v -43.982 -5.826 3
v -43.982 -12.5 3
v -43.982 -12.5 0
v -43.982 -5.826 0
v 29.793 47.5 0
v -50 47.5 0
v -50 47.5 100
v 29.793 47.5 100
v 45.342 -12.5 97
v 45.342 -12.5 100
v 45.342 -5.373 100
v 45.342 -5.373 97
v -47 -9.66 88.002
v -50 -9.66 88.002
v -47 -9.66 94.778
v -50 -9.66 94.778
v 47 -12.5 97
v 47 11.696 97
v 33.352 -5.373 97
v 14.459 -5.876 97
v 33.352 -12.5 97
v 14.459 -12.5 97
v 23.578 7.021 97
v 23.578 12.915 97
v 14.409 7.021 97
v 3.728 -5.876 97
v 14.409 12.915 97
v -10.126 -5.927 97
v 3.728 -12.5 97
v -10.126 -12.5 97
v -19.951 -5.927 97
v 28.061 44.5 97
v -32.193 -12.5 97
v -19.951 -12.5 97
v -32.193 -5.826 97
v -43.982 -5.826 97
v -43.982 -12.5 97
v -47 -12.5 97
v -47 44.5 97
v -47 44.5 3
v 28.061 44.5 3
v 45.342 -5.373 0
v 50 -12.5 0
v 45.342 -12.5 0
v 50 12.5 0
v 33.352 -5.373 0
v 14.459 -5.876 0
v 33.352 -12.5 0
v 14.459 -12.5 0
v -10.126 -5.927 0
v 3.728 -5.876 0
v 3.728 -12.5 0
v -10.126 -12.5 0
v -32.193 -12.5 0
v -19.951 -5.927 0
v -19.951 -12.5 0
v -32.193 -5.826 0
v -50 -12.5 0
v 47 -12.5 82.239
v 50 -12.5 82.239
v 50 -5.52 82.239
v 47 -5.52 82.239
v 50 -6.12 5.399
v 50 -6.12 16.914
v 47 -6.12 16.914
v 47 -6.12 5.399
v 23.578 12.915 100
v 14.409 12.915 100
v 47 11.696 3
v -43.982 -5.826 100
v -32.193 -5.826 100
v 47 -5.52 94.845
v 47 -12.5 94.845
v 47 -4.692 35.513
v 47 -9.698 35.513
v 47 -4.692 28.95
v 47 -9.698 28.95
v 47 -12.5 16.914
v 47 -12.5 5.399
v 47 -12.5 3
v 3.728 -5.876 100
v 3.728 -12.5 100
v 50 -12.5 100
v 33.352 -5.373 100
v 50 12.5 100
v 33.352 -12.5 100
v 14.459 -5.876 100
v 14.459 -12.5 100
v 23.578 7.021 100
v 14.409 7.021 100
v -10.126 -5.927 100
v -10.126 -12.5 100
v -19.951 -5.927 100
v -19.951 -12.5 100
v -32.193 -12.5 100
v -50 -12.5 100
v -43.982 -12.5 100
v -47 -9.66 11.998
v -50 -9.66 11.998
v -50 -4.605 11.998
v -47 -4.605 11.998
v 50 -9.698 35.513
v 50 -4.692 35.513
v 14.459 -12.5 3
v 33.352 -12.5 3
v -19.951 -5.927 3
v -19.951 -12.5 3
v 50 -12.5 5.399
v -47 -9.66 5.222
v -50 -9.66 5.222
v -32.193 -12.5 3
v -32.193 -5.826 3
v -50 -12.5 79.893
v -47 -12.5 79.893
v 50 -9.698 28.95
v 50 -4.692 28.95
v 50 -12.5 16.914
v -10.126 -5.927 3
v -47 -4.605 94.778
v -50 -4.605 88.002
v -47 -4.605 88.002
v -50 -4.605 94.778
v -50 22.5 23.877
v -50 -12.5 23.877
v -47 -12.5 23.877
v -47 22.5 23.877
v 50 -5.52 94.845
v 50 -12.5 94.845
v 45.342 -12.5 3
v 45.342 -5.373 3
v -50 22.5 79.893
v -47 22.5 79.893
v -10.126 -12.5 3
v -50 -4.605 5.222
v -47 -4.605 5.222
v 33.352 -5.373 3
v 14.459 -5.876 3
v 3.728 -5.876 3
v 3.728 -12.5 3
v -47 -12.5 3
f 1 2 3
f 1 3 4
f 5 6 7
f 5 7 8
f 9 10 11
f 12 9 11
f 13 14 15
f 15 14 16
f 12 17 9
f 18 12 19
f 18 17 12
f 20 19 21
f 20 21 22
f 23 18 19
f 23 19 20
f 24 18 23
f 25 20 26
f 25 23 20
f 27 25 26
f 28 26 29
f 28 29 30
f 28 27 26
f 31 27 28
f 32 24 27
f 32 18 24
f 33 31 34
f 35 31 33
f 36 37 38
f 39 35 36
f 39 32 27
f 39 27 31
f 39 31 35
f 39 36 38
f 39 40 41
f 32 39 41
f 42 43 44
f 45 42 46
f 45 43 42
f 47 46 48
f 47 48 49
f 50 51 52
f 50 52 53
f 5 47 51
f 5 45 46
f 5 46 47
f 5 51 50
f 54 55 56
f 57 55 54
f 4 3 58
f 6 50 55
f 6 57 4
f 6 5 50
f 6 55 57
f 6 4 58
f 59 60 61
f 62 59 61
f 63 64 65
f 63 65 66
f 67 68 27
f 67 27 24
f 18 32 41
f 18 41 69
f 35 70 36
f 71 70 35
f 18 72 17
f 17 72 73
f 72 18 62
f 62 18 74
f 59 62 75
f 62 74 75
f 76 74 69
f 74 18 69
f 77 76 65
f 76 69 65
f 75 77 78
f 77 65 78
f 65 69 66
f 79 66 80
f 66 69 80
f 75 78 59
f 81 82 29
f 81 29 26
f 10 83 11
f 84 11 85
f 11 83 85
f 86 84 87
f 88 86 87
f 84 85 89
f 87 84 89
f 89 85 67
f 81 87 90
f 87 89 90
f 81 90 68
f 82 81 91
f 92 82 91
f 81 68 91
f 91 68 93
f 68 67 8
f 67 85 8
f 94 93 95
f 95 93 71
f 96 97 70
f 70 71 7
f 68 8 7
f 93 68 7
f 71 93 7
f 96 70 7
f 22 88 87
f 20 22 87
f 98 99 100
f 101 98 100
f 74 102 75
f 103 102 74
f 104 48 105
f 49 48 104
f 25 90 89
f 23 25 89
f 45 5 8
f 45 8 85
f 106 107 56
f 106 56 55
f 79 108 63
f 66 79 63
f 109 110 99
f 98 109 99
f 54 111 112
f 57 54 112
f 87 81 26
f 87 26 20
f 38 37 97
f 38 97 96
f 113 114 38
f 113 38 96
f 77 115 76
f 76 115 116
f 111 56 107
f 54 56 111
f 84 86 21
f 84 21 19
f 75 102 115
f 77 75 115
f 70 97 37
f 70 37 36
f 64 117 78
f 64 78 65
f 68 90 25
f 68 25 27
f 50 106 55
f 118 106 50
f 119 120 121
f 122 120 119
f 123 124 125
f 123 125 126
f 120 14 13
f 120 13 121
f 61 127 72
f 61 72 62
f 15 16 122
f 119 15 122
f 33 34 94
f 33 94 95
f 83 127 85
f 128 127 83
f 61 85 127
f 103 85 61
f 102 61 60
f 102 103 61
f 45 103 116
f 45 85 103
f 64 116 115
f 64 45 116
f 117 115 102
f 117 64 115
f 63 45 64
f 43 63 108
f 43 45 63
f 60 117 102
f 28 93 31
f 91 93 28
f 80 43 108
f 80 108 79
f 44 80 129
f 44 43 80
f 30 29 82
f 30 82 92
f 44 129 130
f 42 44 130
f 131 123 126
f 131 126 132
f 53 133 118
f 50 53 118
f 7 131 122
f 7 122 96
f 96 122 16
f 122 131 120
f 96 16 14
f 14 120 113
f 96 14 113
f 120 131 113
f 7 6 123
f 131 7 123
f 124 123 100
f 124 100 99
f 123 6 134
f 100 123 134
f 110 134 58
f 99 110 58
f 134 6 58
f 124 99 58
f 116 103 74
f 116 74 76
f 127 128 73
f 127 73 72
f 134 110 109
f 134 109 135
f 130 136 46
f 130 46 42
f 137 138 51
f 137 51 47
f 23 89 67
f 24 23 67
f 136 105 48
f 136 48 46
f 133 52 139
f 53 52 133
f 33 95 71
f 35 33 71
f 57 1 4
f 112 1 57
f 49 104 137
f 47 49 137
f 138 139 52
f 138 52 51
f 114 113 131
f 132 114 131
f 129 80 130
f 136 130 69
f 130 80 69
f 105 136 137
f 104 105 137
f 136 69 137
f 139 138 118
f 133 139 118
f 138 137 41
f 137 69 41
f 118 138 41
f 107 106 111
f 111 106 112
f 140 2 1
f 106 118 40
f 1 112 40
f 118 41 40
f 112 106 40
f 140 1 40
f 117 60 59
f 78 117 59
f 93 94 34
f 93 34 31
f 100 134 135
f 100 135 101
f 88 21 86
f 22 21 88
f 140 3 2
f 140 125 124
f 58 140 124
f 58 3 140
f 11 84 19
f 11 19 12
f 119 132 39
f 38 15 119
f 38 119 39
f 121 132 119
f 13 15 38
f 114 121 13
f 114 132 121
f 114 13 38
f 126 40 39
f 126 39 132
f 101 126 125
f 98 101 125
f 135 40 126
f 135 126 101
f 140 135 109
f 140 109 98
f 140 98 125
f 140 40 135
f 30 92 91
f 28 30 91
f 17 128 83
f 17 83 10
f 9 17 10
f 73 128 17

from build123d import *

# Parameters (mm, degrees)
BOSS_EXTRUDE1_DEPTH = 100
SHELL1_T            = -3
SKETCH2_W           = 56.015644735
SKETCH2_H           = 35
CUT_EXTRUDE1_DEPTH  = 10
SKETCH3_W           = 12.606592538
SKETCH3_H           = 6.980178381
SKETCH3_W_2         = 11.515112664
SKETCH3_H_2         = 6.37986445
CUT_EXTRUDE2_DEPTH  = 10
SKETCH4_W           = 9.169229256
SKETCH4_H           = 5.894504522
CUT_EXTRUDE3_DEPTH  = 10
SKETCH5_W           = 6.776014824
SKETCH5_H           = 5.054240566
CUT_EXTRUDE4_DEPTH  = 10
SKETCH6_W           = 11.990530565
SKETCH6_H           = 7.12730724
CUT_EXTRUDE5_DEPTH  = 122.475306133
SKETCH8_W           = 6.563036955
SKETCH8_H           = 5.005706152
CUT_EXTRUDE6_DEPTH  = 10
SKETCH9_W           = 11.789009043
SKETCH9_H           = 6.673883815
SKETCH9_W_2         = 10.731021053
SKETCH9_H_2         = 6.623503435
SKETCH9_W_3         = 9.824174203
SKETCH9_H_3         = 6.573123054
CUT_EXTRUDE7_DEPTH  = 122.475306133


with BuildPart() as part:
    # Sketch1 → Boss-Extrude1 (new body)
    with BuildSketch(Plane.XY):
        Polygon((-50, 12.5), (-50, 47.5), (29.792740578, 47.5), (50, 12.5), (50, -12.5), (-50, -12.5), align=None)
    extrude(amount=BOSS_EXTRUDE1_DEPTH)

    # Shell1
    shell1_openings = [part.faces().sort_by_distance(p)[0] for p in [
        (0, -12.5, 50),
    ]]
    offset(amount=SHELL1_T, openings=shell1_openings, kind=Kind.INTERSECTION)

    # Sketch2 → Cut-Extrude1 (cut)
    with BuildSketch(Plane.ZY.offset(50)):
        with Locations((51.884685058, 5)):
            Rectangle(SKETCH2_W, SKETCH2_H)
    extrude(amount=-CUT_EXTRUDE1_DEPTH, mode=Mode.SUBTRACT)

    # Sketch3 → Cut-Extrude2 (cut)
    with BuildSketch(Plane(origin=(50, 0, 0), x_dir=(0, 0, -1), z_dir=(1, 0, 0))):
        with Locations((-88.542199405, -9.009910809)):
            Rectangle(SKETCH3_W, SKETCH3_H)
        with Locations((-11.156276384, -9.310067775)):
            Rectangle(SKETCH3_W_2, SKETCH3_H_2)
    extrude(amount=-CUT_EXTRUDE2_DEPTH, mode=Mode.SUBTRACT)

    # Sketch4 → Cut-Extrude3 (cut)
    with BuildSketch(Plane.XY.offset(100)):
        with Locations((18.993403459, 9.968133111)):
            Rectangle(SKETCH4_W, SKETCH4_H)
    extrude(amount=-CUT_EXTRUDE3_DEPTH, mode=Mode.SUBTRACT)

    # Sketch5 → Cut-Extrude4 (cut)
    with BuildSketch(Plane.ZY.offset(50)):
        with Locations((8.609898129, -7.132480119)):
            Rectangle(SKETCH5_W, SKETCH5_H)
        with Locations((91.390101871, -7.132480119)):
            Rectangle(SKETCH5_W, SKETCH5_H)
    extrude(amount=-CUT_EXTRUDE4_DEPTH, mode=Mode.SUBTRACT)

    # Sketch6 → Cut-Extrude5 (cut, through all)
    with BuildSketch(Plane.XY.offset(100)):
        with Locations((39.347077193, -8.93634638)):
            Rectangle(SKETCH6_W, SKETCH6_H)
    extrude(amount=-CUT_EXTRUDE5_DEPTH, mode=Mode.SUBTRACT)

    # Sketch8 → Cut-Extrude6 (cut)
    with BuildSketch(Plane(origin=(50, 0, 0), x_dir=(0, 0, -1), z_dir=(1, 0, 0))):
        with Locations((-32.231091097, -7.194817018)):
            Rectangle(SKETCH8_W, SKETCH8_H)
    extrude(amount=-CUT_EXTRUDE6_DEPTH, mode=Mode.SUBTRACT)

    # Sketch9 → Cut-Extrude7 (cut, through all)
    with BuildSketch(Plane.XY.offset(100)):
        with Locations((-38.087567679, -9.163058093)):
            Rectangle(SKETCH9_W, SKETCH9_H)
        with Locations((9.093658686, -9.188248283)):
            Rectangle(SKETCH9_W_2, SKETCH9_H_2)
        with Locations((-15.038543588, -9.213438473)):
            Rectangle(SKETCH9_W_3, SKETCH9_H_3)
    extrude(amount=-CUT_EXTRUDE7_DEPTH, mode=Mode.SUBTRACT)


solid = part.part
